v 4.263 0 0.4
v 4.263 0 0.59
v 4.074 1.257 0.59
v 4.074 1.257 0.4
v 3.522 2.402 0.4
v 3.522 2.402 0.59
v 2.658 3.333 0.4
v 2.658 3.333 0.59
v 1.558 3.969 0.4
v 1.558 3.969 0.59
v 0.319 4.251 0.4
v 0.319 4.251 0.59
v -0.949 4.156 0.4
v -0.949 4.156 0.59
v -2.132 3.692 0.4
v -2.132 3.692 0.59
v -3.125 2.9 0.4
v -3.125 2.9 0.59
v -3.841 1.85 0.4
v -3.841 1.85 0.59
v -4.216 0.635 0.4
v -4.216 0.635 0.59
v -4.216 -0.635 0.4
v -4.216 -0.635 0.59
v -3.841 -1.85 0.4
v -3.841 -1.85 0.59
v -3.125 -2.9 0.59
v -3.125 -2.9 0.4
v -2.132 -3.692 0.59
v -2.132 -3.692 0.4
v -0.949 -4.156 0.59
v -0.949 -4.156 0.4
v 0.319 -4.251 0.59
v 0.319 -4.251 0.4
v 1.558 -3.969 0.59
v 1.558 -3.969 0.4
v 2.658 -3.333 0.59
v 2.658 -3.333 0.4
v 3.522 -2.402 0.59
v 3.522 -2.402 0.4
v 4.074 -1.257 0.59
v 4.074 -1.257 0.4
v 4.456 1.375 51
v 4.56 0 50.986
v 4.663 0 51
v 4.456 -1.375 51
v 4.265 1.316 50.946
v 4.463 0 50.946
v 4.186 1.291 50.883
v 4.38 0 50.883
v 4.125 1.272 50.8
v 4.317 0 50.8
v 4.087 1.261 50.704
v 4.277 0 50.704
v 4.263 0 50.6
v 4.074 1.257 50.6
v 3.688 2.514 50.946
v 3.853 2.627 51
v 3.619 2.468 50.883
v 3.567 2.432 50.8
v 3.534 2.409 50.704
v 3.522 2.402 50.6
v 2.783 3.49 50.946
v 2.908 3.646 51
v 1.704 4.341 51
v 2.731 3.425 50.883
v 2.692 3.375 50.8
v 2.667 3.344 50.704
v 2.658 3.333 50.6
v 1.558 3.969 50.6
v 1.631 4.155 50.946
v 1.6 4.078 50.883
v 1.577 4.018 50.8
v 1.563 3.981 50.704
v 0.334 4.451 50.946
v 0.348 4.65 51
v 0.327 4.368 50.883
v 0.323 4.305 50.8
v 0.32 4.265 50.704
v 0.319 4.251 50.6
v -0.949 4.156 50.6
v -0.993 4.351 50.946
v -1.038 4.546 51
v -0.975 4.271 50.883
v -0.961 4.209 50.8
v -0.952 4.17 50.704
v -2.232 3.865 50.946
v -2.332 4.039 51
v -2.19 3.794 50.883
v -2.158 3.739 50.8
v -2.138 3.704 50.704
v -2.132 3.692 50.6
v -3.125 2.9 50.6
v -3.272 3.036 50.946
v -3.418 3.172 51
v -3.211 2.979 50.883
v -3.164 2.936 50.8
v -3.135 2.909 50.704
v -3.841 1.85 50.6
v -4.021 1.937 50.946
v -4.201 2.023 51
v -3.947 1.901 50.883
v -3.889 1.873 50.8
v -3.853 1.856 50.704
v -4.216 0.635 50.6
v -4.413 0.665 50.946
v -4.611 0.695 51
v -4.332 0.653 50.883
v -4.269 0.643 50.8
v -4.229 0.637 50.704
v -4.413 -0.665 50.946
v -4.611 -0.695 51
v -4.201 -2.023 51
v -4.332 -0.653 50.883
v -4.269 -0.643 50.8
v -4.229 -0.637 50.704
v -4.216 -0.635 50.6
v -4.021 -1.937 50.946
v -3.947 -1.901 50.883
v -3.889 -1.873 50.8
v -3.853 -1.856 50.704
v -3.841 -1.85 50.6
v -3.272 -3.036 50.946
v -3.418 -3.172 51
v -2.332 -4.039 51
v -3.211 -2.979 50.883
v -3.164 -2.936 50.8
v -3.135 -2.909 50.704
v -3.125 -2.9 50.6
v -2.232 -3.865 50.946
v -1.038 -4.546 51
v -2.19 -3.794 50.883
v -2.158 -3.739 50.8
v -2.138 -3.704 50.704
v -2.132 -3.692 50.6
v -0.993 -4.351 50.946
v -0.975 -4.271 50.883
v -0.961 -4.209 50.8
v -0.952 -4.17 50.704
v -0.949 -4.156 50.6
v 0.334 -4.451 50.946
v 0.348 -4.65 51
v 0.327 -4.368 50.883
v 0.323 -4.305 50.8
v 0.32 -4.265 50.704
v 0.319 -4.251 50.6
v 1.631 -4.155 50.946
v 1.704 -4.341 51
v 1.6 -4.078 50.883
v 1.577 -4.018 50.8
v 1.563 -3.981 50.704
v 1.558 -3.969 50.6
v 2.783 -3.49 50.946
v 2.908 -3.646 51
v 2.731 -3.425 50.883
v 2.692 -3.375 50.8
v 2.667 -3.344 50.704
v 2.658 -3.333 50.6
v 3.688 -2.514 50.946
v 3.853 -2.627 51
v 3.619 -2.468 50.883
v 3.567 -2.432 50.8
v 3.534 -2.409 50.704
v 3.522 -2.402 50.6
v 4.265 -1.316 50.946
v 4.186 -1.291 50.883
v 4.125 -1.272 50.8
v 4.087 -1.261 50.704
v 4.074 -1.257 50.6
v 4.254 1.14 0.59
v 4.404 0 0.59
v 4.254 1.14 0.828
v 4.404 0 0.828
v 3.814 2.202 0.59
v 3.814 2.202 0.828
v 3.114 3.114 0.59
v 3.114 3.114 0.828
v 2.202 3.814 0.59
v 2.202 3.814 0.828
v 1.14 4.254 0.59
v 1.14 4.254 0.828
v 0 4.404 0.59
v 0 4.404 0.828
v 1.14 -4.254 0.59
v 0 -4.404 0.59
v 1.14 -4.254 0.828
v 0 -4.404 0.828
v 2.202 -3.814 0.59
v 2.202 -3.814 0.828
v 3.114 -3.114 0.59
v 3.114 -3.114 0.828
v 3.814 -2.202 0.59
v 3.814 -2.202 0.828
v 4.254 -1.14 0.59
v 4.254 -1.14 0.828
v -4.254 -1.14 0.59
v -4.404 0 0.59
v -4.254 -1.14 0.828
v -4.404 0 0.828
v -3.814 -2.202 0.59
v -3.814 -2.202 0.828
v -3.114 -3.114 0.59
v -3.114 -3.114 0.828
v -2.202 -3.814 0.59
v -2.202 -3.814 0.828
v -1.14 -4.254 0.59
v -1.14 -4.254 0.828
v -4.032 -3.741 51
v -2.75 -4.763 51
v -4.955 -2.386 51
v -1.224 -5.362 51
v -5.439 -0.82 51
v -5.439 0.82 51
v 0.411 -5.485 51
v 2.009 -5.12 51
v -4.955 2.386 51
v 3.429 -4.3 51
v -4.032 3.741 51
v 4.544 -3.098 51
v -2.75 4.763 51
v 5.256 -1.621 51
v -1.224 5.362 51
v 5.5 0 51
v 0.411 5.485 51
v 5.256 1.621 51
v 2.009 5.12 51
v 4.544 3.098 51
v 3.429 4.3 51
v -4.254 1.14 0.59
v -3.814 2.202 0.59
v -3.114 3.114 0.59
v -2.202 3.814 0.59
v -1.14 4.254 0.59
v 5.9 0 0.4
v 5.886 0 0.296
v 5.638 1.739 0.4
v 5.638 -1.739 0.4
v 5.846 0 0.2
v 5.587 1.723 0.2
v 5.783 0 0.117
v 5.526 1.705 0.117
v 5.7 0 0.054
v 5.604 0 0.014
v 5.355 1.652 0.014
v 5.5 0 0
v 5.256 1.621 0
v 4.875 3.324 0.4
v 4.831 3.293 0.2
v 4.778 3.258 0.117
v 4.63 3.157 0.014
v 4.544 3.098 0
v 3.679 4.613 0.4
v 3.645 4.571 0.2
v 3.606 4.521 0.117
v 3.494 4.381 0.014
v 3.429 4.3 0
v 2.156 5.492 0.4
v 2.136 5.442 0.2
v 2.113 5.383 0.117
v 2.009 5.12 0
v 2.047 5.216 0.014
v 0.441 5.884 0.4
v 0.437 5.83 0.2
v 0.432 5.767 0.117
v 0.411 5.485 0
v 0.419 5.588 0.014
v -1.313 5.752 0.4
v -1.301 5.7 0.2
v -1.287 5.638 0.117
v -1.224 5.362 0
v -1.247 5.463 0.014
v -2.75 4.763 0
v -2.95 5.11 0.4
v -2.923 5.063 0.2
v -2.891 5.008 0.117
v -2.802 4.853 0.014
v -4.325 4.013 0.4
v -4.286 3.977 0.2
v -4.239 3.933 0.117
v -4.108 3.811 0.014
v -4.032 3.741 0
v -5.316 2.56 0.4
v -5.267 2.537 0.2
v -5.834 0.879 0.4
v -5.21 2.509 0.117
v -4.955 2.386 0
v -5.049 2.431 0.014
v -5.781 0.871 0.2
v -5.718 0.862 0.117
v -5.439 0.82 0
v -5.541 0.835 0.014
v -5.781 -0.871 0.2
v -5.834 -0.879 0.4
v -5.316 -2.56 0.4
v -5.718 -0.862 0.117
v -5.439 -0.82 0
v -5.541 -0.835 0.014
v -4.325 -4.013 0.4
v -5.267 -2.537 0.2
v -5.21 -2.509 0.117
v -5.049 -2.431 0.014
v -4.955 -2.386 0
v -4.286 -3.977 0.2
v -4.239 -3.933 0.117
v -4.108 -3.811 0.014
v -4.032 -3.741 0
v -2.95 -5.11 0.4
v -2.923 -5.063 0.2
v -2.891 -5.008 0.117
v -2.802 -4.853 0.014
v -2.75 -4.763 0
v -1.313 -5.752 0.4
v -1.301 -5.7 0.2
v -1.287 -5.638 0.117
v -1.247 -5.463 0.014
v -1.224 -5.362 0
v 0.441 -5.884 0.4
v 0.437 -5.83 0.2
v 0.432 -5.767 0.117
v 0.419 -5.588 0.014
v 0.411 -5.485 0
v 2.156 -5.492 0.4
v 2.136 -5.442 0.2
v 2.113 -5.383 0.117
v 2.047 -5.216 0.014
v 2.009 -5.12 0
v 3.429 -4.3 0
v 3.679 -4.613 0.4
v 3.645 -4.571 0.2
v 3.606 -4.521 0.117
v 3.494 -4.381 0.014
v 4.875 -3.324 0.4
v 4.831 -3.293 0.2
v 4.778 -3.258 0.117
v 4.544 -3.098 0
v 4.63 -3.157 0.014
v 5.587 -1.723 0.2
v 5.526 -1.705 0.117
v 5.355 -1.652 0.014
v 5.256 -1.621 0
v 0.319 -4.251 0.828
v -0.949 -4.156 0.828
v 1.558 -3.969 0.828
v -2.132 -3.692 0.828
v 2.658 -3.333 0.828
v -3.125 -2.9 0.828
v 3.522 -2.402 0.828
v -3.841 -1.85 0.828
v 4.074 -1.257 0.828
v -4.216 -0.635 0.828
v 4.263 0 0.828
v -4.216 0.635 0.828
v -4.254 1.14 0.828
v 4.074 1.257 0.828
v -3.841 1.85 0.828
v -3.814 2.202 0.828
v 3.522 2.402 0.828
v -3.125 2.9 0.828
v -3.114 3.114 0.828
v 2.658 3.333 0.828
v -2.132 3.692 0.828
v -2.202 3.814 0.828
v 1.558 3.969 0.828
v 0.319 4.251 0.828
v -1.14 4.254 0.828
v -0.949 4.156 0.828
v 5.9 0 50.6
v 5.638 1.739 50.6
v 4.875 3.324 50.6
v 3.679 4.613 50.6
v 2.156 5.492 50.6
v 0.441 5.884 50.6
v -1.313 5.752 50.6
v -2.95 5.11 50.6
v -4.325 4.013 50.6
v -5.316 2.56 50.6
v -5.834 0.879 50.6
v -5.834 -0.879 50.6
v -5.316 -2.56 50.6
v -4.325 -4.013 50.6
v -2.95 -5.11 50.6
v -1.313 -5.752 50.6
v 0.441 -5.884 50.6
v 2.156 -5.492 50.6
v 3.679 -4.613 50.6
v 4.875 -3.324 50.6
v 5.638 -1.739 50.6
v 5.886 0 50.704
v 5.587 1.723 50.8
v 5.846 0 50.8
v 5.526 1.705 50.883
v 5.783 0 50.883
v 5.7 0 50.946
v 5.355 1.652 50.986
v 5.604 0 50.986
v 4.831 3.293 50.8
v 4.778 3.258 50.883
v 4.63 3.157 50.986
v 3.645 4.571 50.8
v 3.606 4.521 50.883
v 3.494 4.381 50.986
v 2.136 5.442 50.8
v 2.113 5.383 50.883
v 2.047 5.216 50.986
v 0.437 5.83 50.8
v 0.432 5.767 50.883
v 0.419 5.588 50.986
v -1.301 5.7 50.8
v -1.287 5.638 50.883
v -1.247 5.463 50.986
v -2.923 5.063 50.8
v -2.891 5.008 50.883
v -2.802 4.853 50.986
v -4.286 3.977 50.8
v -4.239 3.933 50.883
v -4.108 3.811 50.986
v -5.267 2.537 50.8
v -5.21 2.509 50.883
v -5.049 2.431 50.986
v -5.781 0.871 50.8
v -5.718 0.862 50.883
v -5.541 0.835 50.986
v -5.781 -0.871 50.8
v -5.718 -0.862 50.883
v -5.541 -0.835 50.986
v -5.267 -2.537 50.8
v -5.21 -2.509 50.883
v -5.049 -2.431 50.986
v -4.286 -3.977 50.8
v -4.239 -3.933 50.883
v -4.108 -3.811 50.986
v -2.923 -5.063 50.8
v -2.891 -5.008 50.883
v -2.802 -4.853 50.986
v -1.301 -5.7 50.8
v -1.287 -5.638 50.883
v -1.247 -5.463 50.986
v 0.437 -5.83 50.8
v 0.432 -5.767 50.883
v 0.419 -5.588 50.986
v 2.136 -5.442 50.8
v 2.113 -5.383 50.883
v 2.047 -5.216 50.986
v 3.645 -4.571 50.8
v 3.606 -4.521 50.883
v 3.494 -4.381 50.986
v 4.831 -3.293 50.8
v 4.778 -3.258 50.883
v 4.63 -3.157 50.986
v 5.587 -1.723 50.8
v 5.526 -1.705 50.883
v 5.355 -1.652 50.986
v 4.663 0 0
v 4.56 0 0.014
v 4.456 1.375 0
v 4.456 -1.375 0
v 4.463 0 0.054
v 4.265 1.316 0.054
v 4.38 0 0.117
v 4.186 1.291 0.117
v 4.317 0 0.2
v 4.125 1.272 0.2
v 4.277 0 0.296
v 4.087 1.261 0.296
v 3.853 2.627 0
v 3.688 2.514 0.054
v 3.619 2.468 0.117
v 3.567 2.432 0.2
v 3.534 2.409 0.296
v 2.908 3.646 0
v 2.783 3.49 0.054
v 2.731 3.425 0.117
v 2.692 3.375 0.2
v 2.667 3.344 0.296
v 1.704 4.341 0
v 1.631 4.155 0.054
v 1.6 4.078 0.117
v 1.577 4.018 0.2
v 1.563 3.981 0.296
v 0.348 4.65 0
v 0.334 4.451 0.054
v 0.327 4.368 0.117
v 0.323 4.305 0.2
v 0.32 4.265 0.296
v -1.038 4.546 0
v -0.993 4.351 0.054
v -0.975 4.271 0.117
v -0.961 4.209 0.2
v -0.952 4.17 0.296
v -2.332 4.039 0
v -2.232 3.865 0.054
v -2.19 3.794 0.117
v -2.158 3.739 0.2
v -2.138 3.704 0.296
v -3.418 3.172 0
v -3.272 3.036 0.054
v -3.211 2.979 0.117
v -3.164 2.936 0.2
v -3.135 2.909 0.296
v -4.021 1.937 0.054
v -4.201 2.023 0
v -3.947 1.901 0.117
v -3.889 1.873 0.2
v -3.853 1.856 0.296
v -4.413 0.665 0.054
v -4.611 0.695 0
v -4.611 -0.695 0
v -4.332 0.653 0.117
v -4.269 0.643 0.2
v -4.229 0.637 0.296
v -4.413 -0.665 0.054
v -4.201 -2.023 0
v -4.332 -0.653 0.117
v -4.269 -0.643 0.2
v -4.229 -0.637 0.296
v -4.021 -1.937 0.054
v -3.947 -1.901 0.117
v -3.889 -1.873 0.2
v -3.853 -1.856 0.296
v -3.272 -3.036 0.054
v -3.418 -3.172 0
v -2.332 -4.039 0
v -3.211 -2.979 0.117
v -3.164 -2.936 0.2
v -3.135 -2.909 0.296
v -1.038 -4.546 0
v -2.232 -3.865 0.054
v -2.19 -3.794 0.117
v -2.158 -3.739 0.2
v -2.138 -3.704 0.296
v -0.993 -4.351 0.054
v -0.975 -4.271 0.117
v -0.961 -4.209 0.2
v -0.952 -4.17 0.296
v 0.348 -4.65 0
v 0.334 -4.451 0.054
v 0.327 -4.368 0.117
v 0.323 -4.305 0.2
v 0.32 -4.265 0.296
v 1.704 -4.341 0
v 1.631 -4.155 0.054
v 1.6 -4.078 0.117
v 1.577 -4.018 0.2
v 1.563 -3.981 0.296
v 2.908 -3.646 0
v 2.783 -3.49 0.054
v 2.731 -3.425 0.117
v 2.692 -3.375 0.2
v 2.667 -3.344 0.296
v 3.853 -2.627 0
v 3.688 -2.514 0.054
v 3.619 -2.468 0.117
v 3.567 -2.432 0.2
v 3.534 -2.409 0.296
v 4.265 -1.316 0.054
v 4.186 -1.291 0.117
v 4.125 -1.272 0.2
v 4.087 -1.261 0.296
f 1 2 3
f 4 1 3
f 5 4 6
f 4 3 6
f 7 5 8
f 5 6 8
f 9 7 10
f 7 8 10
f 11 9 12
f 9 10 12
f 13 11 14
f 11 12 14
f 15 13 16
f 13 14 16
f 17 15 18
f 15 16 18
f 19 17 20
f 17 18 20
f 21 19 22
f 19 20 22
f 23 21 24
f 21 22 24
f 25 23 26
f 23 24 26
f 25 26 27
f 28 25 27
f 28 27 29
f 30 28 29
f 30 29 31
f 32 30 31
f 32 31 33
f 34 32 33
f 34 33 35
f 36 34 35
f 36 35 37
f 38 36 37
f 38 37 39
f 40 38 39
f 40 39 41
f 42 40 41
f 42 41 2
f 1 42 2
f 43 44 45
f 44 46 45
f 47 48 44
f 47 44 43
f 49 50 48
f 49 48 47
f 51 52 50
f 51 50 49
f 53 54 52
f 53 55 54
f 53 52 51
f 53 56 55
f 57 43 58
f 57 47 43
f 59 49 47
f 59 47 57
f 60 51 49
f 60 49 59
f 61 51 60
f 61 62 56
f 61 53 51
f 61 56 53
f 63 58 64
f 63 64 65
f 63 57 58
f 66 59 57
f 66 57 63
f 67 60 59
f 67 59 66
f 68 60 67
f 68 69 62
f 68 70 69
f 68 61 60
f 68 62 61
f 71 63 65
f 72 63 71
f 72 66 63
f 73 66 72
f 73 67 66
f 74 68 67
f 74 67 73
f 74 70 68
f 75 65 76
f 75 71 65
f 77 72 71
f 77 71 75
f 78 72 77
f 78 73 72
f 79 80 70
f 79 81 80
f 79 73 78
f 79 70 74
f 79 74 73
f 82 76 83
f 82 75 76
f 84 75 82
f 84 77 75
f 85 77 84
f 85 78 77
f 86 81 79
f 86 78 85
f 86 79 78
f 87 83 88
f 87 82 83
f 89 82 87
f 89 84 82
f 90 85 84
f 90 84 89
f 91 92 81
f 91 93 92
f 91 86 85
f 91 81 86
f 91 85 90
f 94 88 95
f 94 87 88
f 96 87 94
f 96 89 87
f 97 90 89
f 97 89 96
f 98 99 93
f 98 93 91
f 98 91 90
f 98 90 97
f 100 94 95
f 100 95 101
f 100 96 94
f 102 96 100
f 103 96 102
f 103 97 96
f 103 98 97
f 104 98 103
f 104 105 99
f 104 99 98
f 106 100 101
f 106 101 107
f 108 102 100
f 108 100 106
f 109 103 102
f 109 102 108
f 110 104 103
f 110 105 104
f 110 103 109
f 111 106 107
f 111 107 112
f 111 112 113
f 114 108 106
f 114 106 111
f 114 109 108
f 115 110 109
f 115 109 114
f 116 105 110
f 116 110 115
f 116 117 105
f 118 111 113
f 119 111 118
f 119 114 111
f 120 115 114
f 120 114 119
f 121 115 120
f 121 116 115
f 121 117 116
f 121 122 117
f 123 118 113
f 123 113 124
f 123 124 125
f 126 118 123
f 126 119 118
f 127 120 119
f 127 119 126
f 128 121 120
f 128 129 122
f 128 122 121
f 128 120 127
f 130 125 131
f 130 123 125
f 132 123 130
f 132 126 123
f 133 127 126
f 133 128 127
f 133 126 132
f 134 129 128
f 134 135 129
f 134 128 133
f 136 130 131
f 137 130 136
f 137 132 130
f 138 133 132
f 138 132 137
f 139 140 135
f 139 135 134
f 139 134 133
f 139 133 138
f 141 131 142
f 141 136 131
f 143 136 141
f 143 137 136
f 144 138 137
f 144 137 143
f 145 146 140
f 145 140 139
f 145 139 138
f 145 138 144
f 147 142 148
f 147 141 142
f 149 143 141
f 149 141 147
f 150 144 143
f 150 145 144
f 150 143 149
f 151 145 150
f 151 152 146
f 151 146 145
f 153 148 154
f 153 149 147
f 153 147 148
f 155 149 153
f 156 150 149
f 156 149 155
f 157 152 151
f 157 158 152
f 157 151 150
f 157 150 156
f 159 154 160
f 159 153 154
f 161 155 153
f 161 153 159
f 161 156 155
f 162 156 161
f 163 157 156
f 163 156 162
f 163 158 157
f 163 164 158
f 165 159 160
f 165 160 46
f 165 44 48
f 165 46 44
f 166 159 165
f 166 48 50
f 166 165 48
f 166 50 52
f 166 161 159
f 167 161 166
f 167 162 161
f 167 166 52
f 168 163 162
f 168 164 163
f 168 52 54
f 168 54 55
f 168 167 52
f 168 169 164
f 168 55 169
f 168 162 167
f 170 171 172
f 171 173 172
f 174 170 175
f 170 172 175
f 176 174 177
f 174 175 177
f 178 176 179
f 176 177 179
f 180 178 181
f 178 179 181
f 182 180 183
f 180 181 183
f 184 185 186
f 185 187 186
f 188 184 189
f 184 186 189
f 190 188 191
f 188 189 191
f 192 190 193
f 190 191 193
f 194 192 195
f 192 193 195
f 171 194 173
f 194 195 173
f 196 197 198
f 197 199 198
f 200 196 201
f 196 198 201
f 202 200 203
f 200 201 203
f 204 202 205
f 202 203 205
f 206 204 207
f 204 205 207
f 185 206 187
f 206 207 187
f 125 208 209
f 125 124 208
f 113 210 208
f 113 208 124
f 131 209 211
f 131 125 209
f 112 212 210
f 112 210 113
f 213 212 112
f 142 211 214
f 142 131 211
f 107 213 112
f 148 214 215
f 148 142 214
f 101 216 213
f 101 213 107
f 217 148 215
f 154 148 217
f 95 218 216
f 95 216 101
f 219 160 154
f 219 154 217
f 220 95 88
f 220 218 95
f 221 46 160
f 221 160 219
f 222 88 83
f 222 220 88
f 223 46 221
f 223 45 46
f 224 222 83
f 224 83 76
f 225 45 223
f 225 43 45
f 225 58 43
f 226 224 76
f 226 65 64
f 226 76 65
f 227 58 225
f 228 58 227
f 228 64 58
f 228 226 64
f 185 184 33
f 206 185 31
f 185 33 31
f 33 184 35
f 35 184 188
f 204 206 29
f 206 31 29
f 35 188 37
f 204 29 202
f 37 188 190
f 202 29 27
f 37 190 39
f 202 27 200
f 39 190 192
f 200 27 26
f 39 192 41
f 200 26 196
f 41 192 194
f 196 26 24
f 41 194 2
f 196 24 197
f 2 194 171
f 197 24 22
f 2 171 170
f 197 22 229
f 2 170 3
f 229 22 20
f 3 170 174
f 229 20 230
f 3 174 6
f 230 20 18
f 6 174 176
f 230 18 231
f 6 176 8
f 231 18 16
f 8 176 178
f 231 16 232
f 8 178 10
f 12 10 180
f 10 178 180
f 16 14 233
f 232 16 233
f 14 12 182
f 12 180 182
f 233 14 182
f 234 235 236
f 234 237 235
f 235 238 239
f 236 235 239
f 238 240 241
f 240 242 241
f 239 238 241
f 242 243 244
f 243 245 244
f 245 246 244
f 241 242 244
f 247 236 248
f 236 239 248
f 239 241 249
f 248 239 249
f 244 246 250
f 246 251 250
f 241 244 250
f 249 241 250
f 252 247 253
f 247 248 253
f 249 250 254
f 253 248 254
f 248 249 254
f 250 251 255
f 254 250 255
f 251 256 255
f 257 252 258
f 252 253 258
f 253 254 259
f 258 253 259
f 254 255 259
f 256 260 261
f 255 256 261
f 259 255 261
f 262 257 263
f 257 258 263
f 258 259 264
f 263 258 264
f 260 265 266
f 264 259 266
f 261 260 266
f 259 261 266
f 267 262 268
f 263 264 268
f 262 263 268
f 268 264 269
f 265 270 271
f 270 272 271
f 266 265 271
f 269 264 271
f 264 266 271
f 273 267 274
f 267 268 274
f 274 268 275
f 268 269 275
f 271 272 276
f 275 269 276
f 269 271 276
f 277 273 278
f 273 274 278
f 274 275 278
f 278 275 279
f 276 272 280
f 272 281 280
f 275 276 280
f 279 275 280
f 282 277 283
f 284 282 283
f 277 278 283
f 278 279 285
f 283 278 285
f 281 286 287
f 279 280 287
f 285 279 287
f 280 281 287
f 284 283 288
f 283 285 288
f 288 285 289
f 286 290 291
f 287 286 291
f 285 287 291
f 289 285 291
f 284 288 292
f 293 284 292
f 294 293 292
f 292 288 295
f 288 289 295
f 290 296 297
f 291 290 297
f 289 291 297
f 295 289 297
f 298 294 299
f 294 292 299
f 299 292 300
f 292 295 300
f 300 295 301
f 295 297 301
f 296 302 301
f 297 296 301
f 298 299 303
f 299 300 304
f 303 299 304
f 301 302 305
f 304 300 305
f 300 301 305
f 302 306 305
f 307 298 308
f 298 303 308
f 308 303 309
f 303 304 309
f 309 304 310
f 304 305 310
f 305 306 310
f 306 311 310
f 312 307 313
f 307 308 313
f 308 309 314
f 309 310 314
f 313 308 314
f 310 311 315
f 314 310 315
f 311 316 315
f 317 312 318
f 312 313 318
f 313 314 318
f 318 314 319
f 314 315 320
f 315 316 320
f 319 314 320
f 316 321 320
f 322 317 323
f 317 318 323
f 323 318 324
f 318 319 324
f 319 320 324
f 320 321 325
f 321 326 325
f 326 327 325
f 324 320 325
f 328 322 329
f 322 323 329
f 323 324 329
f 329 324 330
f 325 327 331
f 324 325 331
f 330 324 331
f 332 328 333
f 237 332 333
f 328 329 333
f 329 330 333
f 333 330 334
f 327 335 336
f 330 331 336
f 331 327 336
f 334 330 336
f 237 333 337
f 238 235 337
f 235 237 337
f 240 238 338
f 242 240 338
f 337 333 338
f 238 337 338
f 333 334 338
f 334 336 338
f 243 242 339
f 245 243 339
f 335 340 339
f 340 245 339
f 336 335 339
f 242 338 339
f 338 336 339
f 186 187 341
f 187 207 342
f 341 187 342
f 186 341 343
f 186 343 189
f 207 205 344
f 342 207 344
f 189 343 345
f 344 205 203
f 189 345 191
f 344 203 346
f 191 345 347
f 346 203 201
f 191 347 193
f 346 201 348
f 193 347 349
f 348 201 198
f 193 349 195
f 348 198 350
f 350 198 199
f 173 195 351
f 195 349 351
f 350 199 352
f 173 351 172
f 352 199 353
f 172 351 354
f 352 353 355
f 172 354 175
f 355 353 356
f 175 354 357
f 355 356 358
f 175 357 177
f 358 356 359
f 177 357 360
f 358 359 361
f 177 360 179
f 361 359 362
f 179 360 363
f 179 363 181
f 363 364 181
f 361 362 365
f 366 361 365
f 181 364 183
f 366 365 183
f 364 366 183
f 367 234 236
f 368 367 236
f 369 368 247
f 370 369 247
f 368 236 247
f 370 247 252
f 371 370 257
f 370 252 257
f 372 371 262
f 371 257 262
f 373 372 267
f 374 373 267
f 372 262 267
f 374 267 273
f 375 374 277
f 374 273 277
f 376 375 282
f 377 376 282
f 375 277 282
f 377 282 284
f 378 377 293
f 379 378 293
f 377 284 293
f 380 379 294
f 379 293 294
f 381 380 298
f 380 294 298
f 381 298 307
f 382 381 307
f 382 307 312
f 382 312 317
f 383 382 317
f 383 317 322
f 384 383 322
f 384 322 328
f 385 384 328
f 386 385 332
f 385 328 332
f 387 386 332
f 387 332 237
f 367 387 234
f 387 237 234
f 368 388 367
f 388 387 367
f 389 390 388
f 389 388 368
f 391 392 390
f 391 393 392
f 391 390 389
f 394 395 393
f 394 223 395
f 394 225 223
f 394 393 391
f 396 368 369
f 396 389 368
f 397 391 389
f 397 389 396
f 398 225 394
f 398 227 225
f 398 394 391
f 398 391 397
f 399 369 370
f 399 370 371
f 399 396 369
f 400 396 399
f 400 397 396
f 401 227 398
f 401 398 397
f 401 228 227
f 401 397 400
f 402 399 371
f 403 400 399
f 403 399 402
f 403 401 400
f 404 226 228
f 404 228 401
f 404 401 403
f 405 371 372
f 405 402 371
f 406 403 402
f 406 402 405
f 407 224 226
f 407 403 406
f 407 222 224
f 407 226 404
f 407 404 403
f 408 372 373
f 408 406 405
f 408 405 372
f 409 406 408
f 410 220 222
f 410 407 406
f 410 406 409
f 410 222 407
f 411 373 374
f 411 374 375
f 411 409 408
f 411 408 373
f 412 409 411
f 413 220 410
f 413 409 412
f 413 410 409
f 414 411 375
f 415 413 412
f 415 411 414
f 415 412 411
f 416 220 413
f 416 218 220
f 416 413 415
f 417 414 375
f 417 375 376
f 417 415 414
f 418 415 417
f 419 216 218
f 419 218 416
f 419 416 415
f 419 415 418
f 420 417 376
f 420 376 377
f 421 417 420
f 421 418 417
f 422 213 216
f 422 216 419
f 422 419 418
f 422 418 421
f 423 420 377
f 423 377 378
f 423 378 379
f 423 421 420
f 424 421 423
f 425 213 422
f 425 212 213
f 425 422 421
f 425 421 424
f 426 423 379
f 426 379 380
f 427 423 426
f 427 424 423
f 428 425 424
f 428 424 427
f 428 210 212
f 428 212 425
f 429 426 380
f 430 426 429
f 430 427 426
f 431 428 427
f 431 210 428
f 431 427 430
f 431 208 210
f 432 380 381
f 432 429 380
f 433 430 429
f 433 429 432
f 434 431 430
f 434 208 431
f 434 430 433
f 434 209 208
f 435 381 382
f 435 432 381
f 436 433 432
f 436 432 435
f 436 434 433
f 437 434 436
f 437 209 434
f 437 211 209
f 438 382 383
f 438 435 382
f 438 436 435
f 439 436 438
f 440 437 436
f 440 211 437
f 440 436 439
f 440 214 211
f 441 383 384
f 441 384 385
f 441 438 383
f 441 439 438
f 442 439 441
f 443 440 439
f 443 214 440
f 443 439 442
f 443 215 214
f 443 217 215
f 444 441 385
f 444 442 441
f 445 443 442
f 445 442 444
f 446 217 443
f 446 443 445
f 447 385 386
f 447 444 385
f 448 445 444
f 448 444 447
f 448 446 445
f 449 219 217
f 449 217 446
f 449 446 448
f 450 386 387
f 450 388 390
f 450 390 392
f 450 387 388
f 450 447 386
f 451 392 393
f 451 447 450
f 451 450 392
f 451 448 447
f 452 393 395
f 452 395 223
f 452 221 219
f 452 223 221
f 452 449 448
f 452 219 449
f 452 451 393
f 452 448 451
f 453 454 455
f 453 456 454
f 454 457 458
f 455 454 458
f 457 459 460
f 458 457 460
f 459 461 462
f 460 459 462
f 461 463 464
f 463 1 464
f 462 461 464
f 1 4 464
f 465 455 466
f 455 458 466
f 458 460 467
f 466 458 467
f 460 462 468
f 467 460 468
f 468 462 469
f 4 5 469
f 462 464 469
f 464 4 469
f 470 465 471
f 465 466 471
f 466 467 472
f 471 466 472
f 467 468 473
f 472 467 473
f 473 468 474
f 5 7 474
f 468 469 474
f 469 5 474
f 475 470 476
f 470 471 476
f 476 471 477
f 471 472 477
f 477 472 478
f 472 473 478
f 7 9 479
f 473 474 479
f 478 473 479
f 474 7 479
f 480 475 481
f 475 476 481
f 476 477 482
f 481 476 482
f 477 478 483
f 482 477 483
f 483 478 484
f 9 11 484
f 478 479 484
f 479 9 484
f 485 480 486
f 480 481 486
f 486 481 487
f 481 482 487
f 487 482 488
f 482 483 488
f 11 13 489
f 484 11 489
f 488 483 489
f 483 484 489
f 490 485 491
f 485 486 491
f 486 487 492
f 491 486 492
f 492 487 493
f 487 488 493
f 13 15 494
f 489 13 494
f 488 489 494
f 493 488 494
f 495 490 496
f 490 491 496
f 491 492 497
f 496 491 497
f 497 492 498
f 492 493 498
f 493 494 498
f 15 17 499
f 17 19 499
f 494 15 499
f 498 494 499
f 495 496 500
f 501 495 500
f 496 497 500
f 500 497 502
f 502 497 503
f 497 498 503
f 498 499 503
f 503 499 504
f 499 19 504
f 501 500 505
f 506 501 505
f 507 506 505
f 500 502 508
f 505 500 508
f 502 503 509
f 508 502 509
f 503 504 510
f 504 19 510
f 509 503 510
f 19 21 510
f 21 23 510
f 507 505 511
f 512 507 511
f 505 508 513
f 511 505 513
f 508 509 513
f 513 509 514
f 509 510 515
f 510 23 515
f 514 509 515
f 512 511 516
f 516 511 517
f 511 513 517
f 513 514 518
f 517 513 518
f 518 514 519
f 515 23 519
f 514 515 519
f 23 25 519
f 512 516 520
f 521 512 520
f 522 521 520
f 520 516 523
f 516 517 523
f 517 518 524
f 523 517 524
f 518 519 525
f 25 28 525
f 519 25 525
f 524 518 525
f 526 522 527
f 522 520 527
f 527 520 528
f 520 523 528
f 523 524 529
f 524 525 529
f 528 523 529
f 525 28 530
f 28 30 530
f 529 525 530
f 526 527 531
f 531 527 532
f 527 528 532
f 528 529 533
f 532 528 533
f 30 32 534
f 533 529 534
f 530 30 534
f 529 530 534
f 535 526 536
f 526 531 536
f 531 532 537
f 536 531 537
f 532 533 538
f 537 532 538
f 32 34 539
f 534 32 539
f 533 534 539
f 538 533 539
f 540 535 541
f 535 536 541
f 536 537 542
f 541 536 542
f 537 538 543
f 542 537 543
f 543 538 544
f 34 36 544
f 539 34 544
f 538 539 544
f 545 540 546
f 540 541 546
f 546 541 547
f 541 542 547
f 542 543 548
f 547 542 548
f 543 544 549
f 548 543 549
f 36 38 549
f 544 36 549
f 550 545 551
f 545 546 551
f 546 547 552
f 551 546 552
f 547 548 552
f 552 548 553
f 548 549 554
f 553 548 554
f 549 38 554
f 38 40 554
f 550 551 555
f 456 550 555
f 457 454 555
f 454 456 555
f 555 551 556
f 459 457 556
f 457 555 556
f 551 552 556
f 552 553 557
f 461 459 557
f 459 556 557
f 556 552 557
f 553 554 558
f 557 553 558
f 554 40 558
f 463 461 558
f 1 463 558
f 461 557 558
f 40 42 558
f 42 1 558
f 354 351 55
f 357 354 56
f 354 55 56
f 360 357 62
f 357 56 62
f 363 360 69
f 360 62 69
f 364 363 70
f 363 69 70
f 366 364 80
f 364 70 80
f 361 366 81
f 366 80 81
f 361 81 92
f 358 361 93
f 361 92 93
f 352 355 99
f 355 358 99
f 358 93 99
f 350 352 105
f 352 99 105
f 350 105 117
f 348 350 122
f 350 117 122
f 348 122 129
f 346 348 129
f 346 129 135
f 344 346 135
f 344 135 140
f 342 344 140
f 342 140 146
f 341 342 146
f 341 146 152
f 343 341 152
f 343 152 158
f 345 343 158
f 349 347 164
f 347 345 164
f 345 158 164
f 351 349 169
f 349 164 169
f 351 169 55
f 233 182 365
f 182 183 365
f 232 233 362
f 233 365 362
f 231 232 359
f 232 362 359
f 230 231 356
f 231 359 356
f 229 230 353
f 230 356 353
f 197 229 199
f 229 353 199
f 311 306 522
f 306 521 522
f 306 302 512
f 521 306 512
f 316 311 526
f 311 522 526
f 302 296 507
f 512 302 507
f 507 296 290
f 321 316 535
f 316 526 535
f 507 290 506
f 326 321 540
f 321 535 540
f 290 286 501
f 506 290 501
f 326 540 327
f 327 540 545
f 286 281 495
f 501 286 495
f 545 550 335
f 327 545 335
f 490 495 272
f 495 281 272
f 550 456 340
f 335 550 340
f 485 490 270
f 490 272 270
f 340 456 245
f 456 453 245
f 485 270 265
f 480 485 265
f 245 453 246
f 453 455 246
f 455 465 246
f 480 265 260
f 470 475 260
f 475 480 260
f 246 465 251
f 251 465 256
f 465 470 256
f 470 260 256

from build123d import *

# Parameters (mm, degrees)
SKETCH1_R      = 5.9
EXTRUDE1_DEPTH = 51
SKETCH2_R      = 4.263277526
EXTRUDE2_DEPTH = 52.678041759
FILLET1_R      = 0.4
SKETCH3_W      = 0.324130055
SKETCH3_H      = 0.237695373


with BuildPart() as part:
    # Sketch1 → Extrude1 (new body)
    with BuildSketch(Plane.XY):
        Circle(SKETCH1_R)
    extrude(amount=EXTRUDE1_DEPTH)

    # Sketch2 → Extrude2 (cut, through all)
    with BuildSketch(Plane.XY.offset(51)):
        Circle(SKETCH2_R)
    extrude(amount=-EXTRUDE2_DEPTH, mode=Mode.SUBTRACT)

    # Fillet1
    fillet1_edges = [part.edges().sort_by_distance(p)[0] for p in [
        (-5.9, 0, 0),
        (-5.9, 0, 51),
        (-4.263277526, 0, 0),
        (-4.263277526, 0, 51),
    ]]
    fillet(fillet1_edges, radius=FILLET1_R)

    # Cut-Sweep2: sweep along a curve in space
    with BuildLine() as cut_sweep2_path:
        ThreePointArc((4.263277526, 0, 0.4), (3.014592449, 3.014592449, 0.4), (0, 4.263277526, 0.4))
        ThreePointArc((0, 4.263277526, 0.4), (-3.014592449, 3.014592449, 0.4), (-4.263277526, 0, 0.4))
        ThreePointArc((-4.263277526, 0, 0.4), (-3.014592449, -3.014592449, 0.4), (0, -4.263277526, 0.4))
        ThreePointArc((0, -4.263277526, 0.4), (3.014592449, -3.014592449, 0.4), (4.263277526, 0, 0.4))
    # Sketch3 → Cut-Sweep2 (sweep, cut)
    with BuildSketch(Plane(origin=(0, 0, 0), x_dir=(1, 0, 0), z_dir=(0, 1, 0))):
        with Locations((-4.241785701, -0.709092592)):
            Rectangle(SKETCH3_W, SKETCH3_H)
    sweep(path=cut_sweep2_path.line, mode=Mode.SUBTRACT)


solid = part.part
